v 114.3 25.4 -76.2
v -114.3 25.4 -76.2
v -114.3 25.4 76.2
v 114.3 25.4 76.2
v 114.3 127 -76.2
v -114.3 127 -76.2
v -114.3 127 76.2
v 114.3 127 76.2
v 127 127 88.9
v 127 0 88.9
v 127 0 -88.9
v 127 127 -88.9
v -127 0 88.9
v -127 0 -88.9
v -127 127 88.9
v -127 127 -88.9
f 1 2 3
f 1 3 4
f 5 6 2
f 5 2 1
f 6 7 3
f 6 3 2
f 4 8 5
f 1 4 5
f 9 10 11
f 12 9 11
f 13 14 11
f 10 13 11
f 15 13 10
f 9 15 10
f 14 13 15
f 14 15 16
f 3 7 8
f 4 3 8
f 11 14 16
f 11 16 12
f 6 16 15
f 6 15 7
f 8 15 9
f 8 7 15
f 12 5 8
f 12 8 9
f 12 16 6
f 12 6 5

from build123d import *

# Parameters (mm, degrees)
SKETCH1_W           = 254
SKETCH1_H           = 177.8
BOSS_EXTRUDE1_DEPTH = 127
SKETCH2_W           = 228.6
SKETCH2_H           = 152.4
CUT_EXTRUDE1_DEPTH  = 101.6


with BuildPart() as part:
    # Sketch1 → Boss-Extrude1 (new body)
    with BuildSketch(Plane(origin=(0, 0, 0), x_dir=(1, 0, 0), z_dir=(0, 1, 0))):
        Rectangle(SKETCH1_W, SKETCH1_H)
    extrude(amount=BOSS_EXTRUDE1_DEPTH)

    # Sketch2 → Cut-Extrude1 (cut)
    with BuildSketch(Plane(origin=(0, 127, 0), x_dir=(1, 0, 0), z_dir=(0, 1, 0))):
        Rectangle(SKETCH2_W, SKETCH2_H)
    extrude(amount=-CUT_EXTRUDE1_DEPTH, mode=Mode.SUBTRACT)


solid = part.part
